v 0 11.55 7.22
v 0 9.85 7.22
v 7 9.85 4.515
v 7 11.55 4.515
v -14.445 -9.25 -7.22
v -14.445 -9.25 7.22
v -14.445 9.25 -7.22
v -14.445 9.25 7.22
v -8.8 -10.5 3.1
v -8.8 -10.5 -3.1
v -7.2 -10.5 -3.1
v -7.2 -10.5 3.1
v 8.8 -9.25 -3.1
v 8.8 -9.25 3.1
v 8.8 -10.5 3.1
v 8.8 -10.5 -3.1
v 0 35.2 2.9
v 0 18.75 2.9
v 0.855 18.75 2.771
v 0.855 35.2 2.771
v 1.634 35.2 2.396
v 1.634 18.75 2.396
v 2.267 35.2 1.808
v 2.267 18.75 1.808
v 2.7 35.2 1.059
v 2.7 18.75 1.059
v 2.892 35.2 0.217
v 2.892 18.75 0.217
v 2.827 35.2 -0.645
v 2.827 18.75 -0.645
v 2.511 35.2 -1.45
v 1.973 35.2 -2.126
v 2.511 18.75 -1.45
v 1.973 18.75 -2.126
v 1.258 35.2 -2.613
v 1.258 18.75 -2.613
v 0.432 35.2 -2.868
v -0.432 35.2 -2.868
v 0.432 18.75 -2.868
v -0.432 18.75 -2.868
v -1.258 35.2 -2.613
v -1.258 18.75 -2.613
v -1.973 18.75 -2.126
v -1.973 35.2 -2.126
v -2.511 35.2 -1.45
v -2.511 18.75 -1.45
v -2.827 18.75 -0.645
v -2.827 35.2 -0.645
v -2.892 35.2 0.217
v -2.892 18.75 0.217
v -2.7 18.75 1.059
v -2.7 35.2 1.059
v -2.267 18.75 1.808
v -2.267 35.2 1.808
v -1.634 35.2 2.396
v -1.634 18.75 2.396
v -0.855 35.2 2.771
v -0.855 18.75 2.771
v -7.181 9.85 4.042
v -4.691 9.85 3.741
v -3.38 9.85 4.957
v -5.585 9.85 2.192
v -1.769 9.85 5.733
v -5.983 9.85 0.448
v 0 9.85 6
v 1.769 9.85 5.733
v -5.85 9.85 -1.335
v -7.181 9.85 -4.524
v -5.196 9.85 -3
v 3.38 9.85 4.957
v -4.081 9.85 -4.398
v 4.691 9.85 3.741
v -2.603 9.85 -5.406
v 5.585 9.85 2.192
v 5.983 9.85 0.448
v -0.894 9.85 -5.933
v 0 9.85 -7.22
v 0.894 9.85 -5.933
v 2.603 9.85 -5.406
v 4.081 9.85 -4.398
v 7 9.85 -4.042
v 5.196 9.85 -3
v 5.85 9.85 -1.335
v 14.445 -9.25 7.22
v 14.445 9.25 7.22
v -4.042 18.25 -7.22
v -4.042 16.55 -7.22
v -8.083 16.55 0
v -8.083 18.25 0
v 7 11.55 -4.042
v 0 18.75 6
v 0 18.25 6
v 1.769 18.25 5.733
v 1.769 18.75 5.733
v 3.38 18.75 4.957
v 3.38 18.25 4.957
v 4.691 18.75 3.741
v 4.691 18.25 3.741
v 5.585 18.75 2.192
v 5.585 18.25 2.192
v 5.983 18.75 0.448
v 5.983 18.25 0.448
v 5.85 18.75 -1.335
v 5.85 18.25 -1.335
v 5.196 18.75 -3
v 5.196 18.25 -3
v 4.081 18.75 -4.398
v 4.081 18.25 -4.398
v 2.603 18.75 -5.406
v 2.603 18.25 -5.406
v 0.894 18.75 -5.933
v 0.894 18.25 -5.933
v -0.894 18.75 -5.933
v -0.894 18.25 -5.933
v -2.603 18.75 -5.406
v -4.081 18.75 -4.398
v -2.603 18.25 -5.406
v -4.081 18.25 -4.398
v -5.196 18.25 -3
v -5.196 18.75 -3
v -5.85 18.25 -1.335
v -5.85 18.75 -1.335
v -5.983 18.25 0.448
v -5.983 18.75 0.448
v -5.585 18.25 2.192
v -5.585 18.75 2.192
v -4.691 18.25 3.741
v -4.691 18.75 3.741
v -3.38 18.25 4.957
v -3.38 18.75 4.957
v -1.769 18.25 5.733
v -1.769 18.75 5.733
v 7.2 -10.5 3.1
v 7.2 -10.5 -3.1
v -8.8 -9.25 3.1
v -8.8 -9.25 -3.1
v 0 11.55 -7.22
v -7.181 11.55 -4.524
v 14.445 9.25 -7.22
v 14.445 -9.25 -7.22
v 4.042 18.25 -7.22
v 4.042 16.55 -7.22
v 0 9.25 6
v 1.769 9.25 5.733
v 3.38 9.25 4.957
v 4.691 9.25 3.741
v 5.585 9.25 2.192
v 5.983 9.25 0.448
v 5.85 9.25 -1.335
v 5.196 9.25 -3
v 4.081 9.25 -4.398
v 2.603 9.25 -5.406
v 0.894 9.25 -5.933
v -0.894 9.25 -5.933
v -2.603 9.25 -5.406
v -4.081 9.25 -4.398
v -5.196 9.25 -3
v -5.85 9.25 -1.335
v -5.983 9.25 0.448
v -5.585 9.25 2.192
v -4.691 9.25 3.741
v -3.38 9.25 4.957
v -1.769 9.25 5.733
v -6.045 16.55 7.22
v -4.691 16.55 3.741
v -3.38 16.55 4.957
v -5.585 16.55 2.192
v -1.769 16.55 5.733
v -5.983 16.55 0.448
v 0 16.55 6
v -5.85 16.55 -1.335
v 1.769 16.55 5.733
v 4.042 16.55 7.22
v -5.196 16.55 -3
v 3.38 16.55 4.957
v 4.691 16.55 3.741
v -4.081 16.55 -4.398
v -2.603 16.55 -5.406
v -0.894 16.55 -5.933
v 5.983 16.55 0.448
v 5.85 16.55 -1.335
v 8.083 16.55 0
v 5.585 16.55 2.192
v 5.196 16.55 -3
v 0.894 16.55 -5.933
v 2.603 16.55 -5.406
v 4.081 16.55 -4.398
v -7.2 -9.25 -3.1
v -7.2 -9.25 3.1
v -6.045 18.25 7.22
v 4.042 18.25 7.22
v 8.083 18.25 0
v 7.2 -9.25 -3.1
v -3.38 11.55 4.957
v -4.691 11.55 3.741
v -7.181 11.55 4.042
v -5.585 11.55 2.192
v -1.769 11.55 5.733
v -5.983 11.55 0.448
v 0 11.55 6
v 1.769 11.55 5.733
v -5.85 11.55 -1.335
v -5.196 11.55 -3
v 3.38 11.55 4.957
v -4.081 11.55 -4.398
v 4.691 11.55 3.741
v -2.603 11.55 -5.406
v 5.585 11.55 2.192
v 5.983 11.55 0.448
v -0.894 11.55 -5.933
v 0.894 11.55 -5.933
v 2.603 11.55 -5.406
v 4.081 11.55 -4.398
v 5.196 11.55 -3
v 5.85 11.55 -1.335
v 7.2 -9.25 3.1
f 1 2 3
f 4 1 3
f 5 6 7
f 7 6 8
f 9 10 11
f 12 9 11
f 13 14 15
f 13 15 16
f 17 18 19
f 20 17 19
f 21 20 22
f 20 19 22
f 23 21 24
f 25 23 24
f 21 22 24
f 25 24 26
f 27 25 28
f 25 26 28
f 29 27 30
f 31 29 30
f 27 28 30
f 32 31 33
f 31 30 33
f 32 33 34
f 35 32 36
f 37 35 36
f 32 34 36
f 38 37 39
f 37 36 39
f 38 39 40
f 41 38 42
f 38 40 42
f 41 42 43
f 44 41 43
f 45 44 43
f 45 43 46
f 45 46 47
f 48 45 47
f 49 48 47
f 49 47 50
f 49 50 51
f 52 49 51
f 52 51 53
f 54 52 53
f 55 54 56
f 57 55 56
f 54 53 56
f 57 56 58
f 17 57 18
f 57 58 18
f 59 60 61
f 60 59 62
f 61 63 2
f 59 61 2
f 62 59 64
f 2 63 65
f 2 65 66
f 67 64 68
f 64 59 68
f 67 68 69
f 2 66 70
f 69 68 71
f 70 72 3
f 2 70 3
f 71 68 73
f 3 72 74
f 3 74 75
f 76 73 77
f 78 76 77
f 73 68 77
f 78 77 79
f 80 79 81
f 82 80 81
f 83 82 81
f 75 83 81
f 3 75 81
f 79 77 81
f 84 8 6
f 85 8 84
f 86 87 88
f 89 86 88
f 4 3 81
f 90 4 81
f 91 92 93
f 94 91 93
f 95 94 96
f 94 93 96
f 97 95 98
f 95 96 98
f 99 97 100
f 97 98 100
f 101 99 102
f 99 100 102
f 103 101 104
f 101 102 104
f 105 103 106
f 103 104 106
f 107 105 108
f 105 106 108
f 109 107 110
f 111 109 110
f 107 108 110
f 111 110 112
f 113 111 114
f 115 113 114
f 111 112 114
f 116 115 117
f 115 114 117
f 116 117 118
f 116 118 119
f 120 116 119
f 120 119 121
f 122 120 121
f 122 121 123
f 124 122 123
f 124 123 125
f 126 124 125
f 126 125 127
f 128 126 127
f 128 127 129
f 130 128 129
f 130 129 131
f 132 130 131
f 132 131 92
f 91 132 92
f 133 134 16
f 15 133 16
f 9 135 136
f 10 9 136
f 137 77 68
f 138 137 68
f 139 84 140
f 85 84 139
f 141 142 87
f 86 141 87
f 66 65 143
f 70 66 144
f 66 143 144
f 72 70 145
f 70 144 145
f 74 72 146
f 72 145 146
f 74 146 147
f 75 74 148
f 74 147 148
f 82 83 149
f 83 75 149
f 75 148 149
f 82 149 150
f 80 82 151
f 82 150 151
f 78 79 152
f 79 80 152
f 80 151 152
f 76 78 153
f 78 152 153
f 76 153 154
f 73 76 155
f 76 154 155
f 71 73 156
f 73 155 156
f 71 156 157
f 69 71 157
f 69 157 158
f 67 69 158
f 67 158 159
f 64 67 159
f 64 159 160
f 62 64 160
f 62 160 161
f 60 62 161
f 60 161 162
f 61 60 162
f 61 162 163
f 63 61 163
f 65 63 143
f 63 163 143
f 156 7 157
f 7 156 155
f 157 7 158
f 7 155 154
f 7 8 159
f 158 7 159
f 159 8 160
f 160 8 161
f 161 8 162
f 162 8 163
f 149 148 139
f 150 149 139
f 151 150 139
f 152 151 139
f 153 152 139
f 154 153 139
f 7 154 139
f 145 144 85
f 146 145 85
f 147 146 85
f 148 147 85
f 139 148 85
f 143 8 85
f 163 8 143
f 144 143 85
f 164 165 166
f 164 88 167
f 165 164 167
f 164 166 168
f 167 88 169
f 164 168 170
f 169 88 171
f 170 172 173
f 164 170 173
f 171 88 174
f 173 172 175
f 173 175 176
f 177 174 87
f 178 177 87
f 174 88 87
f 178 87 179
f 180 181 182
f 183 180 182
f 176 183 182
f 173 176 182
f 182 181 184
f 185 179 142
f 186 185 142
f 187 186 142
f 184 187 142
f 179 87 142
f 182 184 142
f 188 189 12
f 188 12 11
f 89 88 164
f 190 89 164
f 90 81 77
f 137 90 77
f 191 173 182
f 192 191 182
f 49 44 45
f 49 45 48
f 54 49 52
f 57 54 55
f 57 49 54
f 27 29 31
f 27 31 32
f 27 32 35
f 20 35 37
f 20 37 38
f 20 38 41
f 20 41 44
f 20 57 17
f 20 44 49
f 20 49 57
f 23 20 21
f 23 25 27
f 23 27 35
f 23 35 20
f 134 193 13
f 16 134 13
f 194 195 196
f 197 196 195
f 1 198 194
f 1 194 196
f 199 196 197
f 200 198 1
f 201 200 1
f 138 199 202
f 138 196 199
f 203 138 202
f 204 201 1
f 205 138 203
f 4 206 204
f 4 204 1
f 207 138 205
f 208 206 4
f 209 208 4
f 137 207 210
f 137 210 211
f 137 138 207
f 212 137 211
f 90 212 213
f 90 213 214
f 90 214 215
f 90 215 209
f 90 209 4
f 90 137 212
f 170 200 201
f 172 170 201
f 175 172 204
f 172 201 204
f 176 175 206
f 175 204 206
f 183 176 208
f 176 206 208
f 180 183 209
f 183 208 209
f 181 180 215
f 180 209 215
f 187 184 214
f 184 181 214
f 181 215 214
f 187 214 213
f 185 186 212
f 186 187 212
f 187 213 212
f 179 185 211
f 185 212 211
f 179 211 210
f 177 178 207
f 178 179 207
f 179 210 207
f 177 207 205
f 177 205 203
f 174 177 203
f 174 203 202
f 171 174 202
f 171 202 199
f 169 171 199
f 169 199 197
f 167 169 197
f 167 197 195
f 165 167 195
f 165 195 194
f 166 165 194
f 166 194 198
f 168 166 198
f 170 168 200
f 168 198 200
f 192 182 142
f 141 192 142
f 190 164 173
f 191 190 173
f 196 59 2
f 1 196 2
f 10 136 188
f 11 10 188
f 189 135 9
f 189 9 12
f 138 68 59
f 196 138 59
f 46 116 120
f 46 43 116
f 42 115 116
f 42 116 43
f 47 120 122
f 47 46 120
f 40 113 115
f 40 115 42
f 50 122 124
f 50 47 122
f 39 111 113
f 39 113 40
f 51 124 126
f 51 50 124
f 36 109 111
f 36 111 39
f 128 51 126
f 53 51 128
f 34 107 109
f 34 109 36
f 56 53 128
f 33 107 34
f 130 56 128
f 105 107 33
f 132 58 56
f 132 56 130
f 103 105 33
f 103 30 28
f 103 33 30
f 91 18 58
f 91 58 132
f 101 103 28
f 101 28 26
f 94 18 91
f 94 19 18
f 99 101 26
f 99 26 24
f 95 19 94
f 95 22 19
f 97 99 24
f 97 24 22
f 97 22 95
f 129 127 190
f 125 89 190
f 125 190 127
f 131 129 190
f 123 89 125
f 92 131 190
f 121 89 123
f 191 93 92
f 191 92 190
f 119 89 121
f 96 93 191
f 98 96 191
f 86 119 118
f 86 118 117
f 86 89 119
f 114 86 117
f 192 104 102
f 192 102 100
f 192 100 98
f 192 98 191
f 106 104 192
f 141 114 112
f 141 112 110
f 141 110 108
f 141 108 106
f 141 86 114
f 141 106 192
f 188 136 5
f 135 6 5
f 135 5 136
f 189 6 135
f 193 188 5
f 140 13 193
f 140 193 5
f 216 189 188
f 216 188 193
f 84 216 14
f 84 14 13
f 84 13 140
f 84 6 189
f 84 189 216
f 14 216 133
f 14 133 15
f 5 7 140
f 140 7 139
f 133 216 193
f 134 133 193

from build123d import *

# Parameters (mm, degrees)
BODYPROFILE_W         = 28.89
BODYPROFILE_H         = 18.5
BODYBOSS_DEPTH        = 7.22
BUSHINGSTEMPROFILE_R  = 6
BUSHINGSTEM_DEPTH     = 9.5
WASHERPROFILE_R       = 6
WASHERBOSS_DEPTH      = 0.6
LOWERNUTBOSS_DEPTH    = 1.7
UPPERNUTBOSS_START    = 5
UPPERNUTBOSS_DEPTH    = 1.7
ACTUATORBASEPROFILE_R = 2.9
ACTUATORBOSS_DEPTH    = 16.45
LEFTTERMINALPROFILE_W = 1.6
LEFTTERMINALPROFILE_H = 6.2
TERMINALBOSSES_DEPTH  = 10.5


with BuildPart() as part:
    # BodyProfile → BodyBoss (new, symmetric)
    with BuildSketch(Plane.XY):
        Rectangle(BODYPROFILE_W, BODYPROFILE_H)
    extrude(amount=BODYBOSS_DEPTH, both=True)

    # BushingStemProfile → BushingStem (add)
    with BuildSketch(Plane(origin=(0, 9.25, 0), x_dir=(1, 0, 0), z_dir=(0, 1, 0))):
        with Locations(Location((0, 0, 0), (0, 0, 270))):
            Circle(BUSHINGSTEMPROFILE_R)
    extrude(amount=BUSHINGSTEM_DEPTH)

    # WasherProfile → WasherBoss (add)
    with BuildSketch(Plane(origin=(0, 9.25, 0), x_dir=(1, 0, 0), z_dir=(0, 1, 0))):
        with Locations(Location((0, 0, 0), (0, 0, 270))):
            Circle(WASHERPROFILE_R)
    extrude(amount=WASHERBOSS_DEPTH)

    # LowerNutProfile → LowerNutBoss (add)
    with BuildSketch(Plane(origin=(0, 9.85, 0), x_dir=(1, 0, 0), z_dir=(0, 1, 0))):
        Polygon((7, 4.0415), (0, 7.22), (-7.181103891, 4.52386712), (-7.181103891, -4.0415), (0, -7.22), (7, -4.515434504), align=None)
    extrude(amount=LOWERNUTBOSS_DEPTH)

    # UpperNutProfile → UpperNutBoss (add)
    with BuildSketch(Plane(origin=(0, 11.55, 0), x_dir=(1, 0, 0), z_dir=(0, 1, 0)).offset(UPPERNUTBOSS_START)):
        Polygon((8.083, 0), (4.0415, 7.22), (-4.0415, 7.22), (-8.083, 0), (-6.045192426, -7.22), (4.0415, -7.22), align=None)
    extrude(amount=UPPERNUTBOSS_DEPTH)

    # ActuatorBaseProfile → ActuatorBoss (add)
    with BuildSketch(Plane(origin=(0, 18.75, 0), x_dir=(1, 0, 0), z_dir=(0, 1, 0))):
        with Locations(Location((0, 0, 0), (0, 0, 270))):
            Circle(ACTUATORBASEPROFILE_R)
    extrude(amount=ACTUATORBOSS_DEPTH)

    # LeftTerminalProfile → TerminalBosses (add)
    with BuildSketch(Plane(origin=(0, 0, 0), x_dir=(1, 0, 0), z_dir=(0, 1, 0))):
        with Locations((-8, 0)):
            Rectangle(LEFTTERMINALPROFILE_W, LEFTTERMINALPROFILE_H)
        with Locations((8, 0)):
            Rectangle(LEFTTERMINALPROFILE_W, LEFTTERMINALPROFILE_H)
    extrude(amount=-TERMINALBOSSES_DEPTH)


solid = part.part
